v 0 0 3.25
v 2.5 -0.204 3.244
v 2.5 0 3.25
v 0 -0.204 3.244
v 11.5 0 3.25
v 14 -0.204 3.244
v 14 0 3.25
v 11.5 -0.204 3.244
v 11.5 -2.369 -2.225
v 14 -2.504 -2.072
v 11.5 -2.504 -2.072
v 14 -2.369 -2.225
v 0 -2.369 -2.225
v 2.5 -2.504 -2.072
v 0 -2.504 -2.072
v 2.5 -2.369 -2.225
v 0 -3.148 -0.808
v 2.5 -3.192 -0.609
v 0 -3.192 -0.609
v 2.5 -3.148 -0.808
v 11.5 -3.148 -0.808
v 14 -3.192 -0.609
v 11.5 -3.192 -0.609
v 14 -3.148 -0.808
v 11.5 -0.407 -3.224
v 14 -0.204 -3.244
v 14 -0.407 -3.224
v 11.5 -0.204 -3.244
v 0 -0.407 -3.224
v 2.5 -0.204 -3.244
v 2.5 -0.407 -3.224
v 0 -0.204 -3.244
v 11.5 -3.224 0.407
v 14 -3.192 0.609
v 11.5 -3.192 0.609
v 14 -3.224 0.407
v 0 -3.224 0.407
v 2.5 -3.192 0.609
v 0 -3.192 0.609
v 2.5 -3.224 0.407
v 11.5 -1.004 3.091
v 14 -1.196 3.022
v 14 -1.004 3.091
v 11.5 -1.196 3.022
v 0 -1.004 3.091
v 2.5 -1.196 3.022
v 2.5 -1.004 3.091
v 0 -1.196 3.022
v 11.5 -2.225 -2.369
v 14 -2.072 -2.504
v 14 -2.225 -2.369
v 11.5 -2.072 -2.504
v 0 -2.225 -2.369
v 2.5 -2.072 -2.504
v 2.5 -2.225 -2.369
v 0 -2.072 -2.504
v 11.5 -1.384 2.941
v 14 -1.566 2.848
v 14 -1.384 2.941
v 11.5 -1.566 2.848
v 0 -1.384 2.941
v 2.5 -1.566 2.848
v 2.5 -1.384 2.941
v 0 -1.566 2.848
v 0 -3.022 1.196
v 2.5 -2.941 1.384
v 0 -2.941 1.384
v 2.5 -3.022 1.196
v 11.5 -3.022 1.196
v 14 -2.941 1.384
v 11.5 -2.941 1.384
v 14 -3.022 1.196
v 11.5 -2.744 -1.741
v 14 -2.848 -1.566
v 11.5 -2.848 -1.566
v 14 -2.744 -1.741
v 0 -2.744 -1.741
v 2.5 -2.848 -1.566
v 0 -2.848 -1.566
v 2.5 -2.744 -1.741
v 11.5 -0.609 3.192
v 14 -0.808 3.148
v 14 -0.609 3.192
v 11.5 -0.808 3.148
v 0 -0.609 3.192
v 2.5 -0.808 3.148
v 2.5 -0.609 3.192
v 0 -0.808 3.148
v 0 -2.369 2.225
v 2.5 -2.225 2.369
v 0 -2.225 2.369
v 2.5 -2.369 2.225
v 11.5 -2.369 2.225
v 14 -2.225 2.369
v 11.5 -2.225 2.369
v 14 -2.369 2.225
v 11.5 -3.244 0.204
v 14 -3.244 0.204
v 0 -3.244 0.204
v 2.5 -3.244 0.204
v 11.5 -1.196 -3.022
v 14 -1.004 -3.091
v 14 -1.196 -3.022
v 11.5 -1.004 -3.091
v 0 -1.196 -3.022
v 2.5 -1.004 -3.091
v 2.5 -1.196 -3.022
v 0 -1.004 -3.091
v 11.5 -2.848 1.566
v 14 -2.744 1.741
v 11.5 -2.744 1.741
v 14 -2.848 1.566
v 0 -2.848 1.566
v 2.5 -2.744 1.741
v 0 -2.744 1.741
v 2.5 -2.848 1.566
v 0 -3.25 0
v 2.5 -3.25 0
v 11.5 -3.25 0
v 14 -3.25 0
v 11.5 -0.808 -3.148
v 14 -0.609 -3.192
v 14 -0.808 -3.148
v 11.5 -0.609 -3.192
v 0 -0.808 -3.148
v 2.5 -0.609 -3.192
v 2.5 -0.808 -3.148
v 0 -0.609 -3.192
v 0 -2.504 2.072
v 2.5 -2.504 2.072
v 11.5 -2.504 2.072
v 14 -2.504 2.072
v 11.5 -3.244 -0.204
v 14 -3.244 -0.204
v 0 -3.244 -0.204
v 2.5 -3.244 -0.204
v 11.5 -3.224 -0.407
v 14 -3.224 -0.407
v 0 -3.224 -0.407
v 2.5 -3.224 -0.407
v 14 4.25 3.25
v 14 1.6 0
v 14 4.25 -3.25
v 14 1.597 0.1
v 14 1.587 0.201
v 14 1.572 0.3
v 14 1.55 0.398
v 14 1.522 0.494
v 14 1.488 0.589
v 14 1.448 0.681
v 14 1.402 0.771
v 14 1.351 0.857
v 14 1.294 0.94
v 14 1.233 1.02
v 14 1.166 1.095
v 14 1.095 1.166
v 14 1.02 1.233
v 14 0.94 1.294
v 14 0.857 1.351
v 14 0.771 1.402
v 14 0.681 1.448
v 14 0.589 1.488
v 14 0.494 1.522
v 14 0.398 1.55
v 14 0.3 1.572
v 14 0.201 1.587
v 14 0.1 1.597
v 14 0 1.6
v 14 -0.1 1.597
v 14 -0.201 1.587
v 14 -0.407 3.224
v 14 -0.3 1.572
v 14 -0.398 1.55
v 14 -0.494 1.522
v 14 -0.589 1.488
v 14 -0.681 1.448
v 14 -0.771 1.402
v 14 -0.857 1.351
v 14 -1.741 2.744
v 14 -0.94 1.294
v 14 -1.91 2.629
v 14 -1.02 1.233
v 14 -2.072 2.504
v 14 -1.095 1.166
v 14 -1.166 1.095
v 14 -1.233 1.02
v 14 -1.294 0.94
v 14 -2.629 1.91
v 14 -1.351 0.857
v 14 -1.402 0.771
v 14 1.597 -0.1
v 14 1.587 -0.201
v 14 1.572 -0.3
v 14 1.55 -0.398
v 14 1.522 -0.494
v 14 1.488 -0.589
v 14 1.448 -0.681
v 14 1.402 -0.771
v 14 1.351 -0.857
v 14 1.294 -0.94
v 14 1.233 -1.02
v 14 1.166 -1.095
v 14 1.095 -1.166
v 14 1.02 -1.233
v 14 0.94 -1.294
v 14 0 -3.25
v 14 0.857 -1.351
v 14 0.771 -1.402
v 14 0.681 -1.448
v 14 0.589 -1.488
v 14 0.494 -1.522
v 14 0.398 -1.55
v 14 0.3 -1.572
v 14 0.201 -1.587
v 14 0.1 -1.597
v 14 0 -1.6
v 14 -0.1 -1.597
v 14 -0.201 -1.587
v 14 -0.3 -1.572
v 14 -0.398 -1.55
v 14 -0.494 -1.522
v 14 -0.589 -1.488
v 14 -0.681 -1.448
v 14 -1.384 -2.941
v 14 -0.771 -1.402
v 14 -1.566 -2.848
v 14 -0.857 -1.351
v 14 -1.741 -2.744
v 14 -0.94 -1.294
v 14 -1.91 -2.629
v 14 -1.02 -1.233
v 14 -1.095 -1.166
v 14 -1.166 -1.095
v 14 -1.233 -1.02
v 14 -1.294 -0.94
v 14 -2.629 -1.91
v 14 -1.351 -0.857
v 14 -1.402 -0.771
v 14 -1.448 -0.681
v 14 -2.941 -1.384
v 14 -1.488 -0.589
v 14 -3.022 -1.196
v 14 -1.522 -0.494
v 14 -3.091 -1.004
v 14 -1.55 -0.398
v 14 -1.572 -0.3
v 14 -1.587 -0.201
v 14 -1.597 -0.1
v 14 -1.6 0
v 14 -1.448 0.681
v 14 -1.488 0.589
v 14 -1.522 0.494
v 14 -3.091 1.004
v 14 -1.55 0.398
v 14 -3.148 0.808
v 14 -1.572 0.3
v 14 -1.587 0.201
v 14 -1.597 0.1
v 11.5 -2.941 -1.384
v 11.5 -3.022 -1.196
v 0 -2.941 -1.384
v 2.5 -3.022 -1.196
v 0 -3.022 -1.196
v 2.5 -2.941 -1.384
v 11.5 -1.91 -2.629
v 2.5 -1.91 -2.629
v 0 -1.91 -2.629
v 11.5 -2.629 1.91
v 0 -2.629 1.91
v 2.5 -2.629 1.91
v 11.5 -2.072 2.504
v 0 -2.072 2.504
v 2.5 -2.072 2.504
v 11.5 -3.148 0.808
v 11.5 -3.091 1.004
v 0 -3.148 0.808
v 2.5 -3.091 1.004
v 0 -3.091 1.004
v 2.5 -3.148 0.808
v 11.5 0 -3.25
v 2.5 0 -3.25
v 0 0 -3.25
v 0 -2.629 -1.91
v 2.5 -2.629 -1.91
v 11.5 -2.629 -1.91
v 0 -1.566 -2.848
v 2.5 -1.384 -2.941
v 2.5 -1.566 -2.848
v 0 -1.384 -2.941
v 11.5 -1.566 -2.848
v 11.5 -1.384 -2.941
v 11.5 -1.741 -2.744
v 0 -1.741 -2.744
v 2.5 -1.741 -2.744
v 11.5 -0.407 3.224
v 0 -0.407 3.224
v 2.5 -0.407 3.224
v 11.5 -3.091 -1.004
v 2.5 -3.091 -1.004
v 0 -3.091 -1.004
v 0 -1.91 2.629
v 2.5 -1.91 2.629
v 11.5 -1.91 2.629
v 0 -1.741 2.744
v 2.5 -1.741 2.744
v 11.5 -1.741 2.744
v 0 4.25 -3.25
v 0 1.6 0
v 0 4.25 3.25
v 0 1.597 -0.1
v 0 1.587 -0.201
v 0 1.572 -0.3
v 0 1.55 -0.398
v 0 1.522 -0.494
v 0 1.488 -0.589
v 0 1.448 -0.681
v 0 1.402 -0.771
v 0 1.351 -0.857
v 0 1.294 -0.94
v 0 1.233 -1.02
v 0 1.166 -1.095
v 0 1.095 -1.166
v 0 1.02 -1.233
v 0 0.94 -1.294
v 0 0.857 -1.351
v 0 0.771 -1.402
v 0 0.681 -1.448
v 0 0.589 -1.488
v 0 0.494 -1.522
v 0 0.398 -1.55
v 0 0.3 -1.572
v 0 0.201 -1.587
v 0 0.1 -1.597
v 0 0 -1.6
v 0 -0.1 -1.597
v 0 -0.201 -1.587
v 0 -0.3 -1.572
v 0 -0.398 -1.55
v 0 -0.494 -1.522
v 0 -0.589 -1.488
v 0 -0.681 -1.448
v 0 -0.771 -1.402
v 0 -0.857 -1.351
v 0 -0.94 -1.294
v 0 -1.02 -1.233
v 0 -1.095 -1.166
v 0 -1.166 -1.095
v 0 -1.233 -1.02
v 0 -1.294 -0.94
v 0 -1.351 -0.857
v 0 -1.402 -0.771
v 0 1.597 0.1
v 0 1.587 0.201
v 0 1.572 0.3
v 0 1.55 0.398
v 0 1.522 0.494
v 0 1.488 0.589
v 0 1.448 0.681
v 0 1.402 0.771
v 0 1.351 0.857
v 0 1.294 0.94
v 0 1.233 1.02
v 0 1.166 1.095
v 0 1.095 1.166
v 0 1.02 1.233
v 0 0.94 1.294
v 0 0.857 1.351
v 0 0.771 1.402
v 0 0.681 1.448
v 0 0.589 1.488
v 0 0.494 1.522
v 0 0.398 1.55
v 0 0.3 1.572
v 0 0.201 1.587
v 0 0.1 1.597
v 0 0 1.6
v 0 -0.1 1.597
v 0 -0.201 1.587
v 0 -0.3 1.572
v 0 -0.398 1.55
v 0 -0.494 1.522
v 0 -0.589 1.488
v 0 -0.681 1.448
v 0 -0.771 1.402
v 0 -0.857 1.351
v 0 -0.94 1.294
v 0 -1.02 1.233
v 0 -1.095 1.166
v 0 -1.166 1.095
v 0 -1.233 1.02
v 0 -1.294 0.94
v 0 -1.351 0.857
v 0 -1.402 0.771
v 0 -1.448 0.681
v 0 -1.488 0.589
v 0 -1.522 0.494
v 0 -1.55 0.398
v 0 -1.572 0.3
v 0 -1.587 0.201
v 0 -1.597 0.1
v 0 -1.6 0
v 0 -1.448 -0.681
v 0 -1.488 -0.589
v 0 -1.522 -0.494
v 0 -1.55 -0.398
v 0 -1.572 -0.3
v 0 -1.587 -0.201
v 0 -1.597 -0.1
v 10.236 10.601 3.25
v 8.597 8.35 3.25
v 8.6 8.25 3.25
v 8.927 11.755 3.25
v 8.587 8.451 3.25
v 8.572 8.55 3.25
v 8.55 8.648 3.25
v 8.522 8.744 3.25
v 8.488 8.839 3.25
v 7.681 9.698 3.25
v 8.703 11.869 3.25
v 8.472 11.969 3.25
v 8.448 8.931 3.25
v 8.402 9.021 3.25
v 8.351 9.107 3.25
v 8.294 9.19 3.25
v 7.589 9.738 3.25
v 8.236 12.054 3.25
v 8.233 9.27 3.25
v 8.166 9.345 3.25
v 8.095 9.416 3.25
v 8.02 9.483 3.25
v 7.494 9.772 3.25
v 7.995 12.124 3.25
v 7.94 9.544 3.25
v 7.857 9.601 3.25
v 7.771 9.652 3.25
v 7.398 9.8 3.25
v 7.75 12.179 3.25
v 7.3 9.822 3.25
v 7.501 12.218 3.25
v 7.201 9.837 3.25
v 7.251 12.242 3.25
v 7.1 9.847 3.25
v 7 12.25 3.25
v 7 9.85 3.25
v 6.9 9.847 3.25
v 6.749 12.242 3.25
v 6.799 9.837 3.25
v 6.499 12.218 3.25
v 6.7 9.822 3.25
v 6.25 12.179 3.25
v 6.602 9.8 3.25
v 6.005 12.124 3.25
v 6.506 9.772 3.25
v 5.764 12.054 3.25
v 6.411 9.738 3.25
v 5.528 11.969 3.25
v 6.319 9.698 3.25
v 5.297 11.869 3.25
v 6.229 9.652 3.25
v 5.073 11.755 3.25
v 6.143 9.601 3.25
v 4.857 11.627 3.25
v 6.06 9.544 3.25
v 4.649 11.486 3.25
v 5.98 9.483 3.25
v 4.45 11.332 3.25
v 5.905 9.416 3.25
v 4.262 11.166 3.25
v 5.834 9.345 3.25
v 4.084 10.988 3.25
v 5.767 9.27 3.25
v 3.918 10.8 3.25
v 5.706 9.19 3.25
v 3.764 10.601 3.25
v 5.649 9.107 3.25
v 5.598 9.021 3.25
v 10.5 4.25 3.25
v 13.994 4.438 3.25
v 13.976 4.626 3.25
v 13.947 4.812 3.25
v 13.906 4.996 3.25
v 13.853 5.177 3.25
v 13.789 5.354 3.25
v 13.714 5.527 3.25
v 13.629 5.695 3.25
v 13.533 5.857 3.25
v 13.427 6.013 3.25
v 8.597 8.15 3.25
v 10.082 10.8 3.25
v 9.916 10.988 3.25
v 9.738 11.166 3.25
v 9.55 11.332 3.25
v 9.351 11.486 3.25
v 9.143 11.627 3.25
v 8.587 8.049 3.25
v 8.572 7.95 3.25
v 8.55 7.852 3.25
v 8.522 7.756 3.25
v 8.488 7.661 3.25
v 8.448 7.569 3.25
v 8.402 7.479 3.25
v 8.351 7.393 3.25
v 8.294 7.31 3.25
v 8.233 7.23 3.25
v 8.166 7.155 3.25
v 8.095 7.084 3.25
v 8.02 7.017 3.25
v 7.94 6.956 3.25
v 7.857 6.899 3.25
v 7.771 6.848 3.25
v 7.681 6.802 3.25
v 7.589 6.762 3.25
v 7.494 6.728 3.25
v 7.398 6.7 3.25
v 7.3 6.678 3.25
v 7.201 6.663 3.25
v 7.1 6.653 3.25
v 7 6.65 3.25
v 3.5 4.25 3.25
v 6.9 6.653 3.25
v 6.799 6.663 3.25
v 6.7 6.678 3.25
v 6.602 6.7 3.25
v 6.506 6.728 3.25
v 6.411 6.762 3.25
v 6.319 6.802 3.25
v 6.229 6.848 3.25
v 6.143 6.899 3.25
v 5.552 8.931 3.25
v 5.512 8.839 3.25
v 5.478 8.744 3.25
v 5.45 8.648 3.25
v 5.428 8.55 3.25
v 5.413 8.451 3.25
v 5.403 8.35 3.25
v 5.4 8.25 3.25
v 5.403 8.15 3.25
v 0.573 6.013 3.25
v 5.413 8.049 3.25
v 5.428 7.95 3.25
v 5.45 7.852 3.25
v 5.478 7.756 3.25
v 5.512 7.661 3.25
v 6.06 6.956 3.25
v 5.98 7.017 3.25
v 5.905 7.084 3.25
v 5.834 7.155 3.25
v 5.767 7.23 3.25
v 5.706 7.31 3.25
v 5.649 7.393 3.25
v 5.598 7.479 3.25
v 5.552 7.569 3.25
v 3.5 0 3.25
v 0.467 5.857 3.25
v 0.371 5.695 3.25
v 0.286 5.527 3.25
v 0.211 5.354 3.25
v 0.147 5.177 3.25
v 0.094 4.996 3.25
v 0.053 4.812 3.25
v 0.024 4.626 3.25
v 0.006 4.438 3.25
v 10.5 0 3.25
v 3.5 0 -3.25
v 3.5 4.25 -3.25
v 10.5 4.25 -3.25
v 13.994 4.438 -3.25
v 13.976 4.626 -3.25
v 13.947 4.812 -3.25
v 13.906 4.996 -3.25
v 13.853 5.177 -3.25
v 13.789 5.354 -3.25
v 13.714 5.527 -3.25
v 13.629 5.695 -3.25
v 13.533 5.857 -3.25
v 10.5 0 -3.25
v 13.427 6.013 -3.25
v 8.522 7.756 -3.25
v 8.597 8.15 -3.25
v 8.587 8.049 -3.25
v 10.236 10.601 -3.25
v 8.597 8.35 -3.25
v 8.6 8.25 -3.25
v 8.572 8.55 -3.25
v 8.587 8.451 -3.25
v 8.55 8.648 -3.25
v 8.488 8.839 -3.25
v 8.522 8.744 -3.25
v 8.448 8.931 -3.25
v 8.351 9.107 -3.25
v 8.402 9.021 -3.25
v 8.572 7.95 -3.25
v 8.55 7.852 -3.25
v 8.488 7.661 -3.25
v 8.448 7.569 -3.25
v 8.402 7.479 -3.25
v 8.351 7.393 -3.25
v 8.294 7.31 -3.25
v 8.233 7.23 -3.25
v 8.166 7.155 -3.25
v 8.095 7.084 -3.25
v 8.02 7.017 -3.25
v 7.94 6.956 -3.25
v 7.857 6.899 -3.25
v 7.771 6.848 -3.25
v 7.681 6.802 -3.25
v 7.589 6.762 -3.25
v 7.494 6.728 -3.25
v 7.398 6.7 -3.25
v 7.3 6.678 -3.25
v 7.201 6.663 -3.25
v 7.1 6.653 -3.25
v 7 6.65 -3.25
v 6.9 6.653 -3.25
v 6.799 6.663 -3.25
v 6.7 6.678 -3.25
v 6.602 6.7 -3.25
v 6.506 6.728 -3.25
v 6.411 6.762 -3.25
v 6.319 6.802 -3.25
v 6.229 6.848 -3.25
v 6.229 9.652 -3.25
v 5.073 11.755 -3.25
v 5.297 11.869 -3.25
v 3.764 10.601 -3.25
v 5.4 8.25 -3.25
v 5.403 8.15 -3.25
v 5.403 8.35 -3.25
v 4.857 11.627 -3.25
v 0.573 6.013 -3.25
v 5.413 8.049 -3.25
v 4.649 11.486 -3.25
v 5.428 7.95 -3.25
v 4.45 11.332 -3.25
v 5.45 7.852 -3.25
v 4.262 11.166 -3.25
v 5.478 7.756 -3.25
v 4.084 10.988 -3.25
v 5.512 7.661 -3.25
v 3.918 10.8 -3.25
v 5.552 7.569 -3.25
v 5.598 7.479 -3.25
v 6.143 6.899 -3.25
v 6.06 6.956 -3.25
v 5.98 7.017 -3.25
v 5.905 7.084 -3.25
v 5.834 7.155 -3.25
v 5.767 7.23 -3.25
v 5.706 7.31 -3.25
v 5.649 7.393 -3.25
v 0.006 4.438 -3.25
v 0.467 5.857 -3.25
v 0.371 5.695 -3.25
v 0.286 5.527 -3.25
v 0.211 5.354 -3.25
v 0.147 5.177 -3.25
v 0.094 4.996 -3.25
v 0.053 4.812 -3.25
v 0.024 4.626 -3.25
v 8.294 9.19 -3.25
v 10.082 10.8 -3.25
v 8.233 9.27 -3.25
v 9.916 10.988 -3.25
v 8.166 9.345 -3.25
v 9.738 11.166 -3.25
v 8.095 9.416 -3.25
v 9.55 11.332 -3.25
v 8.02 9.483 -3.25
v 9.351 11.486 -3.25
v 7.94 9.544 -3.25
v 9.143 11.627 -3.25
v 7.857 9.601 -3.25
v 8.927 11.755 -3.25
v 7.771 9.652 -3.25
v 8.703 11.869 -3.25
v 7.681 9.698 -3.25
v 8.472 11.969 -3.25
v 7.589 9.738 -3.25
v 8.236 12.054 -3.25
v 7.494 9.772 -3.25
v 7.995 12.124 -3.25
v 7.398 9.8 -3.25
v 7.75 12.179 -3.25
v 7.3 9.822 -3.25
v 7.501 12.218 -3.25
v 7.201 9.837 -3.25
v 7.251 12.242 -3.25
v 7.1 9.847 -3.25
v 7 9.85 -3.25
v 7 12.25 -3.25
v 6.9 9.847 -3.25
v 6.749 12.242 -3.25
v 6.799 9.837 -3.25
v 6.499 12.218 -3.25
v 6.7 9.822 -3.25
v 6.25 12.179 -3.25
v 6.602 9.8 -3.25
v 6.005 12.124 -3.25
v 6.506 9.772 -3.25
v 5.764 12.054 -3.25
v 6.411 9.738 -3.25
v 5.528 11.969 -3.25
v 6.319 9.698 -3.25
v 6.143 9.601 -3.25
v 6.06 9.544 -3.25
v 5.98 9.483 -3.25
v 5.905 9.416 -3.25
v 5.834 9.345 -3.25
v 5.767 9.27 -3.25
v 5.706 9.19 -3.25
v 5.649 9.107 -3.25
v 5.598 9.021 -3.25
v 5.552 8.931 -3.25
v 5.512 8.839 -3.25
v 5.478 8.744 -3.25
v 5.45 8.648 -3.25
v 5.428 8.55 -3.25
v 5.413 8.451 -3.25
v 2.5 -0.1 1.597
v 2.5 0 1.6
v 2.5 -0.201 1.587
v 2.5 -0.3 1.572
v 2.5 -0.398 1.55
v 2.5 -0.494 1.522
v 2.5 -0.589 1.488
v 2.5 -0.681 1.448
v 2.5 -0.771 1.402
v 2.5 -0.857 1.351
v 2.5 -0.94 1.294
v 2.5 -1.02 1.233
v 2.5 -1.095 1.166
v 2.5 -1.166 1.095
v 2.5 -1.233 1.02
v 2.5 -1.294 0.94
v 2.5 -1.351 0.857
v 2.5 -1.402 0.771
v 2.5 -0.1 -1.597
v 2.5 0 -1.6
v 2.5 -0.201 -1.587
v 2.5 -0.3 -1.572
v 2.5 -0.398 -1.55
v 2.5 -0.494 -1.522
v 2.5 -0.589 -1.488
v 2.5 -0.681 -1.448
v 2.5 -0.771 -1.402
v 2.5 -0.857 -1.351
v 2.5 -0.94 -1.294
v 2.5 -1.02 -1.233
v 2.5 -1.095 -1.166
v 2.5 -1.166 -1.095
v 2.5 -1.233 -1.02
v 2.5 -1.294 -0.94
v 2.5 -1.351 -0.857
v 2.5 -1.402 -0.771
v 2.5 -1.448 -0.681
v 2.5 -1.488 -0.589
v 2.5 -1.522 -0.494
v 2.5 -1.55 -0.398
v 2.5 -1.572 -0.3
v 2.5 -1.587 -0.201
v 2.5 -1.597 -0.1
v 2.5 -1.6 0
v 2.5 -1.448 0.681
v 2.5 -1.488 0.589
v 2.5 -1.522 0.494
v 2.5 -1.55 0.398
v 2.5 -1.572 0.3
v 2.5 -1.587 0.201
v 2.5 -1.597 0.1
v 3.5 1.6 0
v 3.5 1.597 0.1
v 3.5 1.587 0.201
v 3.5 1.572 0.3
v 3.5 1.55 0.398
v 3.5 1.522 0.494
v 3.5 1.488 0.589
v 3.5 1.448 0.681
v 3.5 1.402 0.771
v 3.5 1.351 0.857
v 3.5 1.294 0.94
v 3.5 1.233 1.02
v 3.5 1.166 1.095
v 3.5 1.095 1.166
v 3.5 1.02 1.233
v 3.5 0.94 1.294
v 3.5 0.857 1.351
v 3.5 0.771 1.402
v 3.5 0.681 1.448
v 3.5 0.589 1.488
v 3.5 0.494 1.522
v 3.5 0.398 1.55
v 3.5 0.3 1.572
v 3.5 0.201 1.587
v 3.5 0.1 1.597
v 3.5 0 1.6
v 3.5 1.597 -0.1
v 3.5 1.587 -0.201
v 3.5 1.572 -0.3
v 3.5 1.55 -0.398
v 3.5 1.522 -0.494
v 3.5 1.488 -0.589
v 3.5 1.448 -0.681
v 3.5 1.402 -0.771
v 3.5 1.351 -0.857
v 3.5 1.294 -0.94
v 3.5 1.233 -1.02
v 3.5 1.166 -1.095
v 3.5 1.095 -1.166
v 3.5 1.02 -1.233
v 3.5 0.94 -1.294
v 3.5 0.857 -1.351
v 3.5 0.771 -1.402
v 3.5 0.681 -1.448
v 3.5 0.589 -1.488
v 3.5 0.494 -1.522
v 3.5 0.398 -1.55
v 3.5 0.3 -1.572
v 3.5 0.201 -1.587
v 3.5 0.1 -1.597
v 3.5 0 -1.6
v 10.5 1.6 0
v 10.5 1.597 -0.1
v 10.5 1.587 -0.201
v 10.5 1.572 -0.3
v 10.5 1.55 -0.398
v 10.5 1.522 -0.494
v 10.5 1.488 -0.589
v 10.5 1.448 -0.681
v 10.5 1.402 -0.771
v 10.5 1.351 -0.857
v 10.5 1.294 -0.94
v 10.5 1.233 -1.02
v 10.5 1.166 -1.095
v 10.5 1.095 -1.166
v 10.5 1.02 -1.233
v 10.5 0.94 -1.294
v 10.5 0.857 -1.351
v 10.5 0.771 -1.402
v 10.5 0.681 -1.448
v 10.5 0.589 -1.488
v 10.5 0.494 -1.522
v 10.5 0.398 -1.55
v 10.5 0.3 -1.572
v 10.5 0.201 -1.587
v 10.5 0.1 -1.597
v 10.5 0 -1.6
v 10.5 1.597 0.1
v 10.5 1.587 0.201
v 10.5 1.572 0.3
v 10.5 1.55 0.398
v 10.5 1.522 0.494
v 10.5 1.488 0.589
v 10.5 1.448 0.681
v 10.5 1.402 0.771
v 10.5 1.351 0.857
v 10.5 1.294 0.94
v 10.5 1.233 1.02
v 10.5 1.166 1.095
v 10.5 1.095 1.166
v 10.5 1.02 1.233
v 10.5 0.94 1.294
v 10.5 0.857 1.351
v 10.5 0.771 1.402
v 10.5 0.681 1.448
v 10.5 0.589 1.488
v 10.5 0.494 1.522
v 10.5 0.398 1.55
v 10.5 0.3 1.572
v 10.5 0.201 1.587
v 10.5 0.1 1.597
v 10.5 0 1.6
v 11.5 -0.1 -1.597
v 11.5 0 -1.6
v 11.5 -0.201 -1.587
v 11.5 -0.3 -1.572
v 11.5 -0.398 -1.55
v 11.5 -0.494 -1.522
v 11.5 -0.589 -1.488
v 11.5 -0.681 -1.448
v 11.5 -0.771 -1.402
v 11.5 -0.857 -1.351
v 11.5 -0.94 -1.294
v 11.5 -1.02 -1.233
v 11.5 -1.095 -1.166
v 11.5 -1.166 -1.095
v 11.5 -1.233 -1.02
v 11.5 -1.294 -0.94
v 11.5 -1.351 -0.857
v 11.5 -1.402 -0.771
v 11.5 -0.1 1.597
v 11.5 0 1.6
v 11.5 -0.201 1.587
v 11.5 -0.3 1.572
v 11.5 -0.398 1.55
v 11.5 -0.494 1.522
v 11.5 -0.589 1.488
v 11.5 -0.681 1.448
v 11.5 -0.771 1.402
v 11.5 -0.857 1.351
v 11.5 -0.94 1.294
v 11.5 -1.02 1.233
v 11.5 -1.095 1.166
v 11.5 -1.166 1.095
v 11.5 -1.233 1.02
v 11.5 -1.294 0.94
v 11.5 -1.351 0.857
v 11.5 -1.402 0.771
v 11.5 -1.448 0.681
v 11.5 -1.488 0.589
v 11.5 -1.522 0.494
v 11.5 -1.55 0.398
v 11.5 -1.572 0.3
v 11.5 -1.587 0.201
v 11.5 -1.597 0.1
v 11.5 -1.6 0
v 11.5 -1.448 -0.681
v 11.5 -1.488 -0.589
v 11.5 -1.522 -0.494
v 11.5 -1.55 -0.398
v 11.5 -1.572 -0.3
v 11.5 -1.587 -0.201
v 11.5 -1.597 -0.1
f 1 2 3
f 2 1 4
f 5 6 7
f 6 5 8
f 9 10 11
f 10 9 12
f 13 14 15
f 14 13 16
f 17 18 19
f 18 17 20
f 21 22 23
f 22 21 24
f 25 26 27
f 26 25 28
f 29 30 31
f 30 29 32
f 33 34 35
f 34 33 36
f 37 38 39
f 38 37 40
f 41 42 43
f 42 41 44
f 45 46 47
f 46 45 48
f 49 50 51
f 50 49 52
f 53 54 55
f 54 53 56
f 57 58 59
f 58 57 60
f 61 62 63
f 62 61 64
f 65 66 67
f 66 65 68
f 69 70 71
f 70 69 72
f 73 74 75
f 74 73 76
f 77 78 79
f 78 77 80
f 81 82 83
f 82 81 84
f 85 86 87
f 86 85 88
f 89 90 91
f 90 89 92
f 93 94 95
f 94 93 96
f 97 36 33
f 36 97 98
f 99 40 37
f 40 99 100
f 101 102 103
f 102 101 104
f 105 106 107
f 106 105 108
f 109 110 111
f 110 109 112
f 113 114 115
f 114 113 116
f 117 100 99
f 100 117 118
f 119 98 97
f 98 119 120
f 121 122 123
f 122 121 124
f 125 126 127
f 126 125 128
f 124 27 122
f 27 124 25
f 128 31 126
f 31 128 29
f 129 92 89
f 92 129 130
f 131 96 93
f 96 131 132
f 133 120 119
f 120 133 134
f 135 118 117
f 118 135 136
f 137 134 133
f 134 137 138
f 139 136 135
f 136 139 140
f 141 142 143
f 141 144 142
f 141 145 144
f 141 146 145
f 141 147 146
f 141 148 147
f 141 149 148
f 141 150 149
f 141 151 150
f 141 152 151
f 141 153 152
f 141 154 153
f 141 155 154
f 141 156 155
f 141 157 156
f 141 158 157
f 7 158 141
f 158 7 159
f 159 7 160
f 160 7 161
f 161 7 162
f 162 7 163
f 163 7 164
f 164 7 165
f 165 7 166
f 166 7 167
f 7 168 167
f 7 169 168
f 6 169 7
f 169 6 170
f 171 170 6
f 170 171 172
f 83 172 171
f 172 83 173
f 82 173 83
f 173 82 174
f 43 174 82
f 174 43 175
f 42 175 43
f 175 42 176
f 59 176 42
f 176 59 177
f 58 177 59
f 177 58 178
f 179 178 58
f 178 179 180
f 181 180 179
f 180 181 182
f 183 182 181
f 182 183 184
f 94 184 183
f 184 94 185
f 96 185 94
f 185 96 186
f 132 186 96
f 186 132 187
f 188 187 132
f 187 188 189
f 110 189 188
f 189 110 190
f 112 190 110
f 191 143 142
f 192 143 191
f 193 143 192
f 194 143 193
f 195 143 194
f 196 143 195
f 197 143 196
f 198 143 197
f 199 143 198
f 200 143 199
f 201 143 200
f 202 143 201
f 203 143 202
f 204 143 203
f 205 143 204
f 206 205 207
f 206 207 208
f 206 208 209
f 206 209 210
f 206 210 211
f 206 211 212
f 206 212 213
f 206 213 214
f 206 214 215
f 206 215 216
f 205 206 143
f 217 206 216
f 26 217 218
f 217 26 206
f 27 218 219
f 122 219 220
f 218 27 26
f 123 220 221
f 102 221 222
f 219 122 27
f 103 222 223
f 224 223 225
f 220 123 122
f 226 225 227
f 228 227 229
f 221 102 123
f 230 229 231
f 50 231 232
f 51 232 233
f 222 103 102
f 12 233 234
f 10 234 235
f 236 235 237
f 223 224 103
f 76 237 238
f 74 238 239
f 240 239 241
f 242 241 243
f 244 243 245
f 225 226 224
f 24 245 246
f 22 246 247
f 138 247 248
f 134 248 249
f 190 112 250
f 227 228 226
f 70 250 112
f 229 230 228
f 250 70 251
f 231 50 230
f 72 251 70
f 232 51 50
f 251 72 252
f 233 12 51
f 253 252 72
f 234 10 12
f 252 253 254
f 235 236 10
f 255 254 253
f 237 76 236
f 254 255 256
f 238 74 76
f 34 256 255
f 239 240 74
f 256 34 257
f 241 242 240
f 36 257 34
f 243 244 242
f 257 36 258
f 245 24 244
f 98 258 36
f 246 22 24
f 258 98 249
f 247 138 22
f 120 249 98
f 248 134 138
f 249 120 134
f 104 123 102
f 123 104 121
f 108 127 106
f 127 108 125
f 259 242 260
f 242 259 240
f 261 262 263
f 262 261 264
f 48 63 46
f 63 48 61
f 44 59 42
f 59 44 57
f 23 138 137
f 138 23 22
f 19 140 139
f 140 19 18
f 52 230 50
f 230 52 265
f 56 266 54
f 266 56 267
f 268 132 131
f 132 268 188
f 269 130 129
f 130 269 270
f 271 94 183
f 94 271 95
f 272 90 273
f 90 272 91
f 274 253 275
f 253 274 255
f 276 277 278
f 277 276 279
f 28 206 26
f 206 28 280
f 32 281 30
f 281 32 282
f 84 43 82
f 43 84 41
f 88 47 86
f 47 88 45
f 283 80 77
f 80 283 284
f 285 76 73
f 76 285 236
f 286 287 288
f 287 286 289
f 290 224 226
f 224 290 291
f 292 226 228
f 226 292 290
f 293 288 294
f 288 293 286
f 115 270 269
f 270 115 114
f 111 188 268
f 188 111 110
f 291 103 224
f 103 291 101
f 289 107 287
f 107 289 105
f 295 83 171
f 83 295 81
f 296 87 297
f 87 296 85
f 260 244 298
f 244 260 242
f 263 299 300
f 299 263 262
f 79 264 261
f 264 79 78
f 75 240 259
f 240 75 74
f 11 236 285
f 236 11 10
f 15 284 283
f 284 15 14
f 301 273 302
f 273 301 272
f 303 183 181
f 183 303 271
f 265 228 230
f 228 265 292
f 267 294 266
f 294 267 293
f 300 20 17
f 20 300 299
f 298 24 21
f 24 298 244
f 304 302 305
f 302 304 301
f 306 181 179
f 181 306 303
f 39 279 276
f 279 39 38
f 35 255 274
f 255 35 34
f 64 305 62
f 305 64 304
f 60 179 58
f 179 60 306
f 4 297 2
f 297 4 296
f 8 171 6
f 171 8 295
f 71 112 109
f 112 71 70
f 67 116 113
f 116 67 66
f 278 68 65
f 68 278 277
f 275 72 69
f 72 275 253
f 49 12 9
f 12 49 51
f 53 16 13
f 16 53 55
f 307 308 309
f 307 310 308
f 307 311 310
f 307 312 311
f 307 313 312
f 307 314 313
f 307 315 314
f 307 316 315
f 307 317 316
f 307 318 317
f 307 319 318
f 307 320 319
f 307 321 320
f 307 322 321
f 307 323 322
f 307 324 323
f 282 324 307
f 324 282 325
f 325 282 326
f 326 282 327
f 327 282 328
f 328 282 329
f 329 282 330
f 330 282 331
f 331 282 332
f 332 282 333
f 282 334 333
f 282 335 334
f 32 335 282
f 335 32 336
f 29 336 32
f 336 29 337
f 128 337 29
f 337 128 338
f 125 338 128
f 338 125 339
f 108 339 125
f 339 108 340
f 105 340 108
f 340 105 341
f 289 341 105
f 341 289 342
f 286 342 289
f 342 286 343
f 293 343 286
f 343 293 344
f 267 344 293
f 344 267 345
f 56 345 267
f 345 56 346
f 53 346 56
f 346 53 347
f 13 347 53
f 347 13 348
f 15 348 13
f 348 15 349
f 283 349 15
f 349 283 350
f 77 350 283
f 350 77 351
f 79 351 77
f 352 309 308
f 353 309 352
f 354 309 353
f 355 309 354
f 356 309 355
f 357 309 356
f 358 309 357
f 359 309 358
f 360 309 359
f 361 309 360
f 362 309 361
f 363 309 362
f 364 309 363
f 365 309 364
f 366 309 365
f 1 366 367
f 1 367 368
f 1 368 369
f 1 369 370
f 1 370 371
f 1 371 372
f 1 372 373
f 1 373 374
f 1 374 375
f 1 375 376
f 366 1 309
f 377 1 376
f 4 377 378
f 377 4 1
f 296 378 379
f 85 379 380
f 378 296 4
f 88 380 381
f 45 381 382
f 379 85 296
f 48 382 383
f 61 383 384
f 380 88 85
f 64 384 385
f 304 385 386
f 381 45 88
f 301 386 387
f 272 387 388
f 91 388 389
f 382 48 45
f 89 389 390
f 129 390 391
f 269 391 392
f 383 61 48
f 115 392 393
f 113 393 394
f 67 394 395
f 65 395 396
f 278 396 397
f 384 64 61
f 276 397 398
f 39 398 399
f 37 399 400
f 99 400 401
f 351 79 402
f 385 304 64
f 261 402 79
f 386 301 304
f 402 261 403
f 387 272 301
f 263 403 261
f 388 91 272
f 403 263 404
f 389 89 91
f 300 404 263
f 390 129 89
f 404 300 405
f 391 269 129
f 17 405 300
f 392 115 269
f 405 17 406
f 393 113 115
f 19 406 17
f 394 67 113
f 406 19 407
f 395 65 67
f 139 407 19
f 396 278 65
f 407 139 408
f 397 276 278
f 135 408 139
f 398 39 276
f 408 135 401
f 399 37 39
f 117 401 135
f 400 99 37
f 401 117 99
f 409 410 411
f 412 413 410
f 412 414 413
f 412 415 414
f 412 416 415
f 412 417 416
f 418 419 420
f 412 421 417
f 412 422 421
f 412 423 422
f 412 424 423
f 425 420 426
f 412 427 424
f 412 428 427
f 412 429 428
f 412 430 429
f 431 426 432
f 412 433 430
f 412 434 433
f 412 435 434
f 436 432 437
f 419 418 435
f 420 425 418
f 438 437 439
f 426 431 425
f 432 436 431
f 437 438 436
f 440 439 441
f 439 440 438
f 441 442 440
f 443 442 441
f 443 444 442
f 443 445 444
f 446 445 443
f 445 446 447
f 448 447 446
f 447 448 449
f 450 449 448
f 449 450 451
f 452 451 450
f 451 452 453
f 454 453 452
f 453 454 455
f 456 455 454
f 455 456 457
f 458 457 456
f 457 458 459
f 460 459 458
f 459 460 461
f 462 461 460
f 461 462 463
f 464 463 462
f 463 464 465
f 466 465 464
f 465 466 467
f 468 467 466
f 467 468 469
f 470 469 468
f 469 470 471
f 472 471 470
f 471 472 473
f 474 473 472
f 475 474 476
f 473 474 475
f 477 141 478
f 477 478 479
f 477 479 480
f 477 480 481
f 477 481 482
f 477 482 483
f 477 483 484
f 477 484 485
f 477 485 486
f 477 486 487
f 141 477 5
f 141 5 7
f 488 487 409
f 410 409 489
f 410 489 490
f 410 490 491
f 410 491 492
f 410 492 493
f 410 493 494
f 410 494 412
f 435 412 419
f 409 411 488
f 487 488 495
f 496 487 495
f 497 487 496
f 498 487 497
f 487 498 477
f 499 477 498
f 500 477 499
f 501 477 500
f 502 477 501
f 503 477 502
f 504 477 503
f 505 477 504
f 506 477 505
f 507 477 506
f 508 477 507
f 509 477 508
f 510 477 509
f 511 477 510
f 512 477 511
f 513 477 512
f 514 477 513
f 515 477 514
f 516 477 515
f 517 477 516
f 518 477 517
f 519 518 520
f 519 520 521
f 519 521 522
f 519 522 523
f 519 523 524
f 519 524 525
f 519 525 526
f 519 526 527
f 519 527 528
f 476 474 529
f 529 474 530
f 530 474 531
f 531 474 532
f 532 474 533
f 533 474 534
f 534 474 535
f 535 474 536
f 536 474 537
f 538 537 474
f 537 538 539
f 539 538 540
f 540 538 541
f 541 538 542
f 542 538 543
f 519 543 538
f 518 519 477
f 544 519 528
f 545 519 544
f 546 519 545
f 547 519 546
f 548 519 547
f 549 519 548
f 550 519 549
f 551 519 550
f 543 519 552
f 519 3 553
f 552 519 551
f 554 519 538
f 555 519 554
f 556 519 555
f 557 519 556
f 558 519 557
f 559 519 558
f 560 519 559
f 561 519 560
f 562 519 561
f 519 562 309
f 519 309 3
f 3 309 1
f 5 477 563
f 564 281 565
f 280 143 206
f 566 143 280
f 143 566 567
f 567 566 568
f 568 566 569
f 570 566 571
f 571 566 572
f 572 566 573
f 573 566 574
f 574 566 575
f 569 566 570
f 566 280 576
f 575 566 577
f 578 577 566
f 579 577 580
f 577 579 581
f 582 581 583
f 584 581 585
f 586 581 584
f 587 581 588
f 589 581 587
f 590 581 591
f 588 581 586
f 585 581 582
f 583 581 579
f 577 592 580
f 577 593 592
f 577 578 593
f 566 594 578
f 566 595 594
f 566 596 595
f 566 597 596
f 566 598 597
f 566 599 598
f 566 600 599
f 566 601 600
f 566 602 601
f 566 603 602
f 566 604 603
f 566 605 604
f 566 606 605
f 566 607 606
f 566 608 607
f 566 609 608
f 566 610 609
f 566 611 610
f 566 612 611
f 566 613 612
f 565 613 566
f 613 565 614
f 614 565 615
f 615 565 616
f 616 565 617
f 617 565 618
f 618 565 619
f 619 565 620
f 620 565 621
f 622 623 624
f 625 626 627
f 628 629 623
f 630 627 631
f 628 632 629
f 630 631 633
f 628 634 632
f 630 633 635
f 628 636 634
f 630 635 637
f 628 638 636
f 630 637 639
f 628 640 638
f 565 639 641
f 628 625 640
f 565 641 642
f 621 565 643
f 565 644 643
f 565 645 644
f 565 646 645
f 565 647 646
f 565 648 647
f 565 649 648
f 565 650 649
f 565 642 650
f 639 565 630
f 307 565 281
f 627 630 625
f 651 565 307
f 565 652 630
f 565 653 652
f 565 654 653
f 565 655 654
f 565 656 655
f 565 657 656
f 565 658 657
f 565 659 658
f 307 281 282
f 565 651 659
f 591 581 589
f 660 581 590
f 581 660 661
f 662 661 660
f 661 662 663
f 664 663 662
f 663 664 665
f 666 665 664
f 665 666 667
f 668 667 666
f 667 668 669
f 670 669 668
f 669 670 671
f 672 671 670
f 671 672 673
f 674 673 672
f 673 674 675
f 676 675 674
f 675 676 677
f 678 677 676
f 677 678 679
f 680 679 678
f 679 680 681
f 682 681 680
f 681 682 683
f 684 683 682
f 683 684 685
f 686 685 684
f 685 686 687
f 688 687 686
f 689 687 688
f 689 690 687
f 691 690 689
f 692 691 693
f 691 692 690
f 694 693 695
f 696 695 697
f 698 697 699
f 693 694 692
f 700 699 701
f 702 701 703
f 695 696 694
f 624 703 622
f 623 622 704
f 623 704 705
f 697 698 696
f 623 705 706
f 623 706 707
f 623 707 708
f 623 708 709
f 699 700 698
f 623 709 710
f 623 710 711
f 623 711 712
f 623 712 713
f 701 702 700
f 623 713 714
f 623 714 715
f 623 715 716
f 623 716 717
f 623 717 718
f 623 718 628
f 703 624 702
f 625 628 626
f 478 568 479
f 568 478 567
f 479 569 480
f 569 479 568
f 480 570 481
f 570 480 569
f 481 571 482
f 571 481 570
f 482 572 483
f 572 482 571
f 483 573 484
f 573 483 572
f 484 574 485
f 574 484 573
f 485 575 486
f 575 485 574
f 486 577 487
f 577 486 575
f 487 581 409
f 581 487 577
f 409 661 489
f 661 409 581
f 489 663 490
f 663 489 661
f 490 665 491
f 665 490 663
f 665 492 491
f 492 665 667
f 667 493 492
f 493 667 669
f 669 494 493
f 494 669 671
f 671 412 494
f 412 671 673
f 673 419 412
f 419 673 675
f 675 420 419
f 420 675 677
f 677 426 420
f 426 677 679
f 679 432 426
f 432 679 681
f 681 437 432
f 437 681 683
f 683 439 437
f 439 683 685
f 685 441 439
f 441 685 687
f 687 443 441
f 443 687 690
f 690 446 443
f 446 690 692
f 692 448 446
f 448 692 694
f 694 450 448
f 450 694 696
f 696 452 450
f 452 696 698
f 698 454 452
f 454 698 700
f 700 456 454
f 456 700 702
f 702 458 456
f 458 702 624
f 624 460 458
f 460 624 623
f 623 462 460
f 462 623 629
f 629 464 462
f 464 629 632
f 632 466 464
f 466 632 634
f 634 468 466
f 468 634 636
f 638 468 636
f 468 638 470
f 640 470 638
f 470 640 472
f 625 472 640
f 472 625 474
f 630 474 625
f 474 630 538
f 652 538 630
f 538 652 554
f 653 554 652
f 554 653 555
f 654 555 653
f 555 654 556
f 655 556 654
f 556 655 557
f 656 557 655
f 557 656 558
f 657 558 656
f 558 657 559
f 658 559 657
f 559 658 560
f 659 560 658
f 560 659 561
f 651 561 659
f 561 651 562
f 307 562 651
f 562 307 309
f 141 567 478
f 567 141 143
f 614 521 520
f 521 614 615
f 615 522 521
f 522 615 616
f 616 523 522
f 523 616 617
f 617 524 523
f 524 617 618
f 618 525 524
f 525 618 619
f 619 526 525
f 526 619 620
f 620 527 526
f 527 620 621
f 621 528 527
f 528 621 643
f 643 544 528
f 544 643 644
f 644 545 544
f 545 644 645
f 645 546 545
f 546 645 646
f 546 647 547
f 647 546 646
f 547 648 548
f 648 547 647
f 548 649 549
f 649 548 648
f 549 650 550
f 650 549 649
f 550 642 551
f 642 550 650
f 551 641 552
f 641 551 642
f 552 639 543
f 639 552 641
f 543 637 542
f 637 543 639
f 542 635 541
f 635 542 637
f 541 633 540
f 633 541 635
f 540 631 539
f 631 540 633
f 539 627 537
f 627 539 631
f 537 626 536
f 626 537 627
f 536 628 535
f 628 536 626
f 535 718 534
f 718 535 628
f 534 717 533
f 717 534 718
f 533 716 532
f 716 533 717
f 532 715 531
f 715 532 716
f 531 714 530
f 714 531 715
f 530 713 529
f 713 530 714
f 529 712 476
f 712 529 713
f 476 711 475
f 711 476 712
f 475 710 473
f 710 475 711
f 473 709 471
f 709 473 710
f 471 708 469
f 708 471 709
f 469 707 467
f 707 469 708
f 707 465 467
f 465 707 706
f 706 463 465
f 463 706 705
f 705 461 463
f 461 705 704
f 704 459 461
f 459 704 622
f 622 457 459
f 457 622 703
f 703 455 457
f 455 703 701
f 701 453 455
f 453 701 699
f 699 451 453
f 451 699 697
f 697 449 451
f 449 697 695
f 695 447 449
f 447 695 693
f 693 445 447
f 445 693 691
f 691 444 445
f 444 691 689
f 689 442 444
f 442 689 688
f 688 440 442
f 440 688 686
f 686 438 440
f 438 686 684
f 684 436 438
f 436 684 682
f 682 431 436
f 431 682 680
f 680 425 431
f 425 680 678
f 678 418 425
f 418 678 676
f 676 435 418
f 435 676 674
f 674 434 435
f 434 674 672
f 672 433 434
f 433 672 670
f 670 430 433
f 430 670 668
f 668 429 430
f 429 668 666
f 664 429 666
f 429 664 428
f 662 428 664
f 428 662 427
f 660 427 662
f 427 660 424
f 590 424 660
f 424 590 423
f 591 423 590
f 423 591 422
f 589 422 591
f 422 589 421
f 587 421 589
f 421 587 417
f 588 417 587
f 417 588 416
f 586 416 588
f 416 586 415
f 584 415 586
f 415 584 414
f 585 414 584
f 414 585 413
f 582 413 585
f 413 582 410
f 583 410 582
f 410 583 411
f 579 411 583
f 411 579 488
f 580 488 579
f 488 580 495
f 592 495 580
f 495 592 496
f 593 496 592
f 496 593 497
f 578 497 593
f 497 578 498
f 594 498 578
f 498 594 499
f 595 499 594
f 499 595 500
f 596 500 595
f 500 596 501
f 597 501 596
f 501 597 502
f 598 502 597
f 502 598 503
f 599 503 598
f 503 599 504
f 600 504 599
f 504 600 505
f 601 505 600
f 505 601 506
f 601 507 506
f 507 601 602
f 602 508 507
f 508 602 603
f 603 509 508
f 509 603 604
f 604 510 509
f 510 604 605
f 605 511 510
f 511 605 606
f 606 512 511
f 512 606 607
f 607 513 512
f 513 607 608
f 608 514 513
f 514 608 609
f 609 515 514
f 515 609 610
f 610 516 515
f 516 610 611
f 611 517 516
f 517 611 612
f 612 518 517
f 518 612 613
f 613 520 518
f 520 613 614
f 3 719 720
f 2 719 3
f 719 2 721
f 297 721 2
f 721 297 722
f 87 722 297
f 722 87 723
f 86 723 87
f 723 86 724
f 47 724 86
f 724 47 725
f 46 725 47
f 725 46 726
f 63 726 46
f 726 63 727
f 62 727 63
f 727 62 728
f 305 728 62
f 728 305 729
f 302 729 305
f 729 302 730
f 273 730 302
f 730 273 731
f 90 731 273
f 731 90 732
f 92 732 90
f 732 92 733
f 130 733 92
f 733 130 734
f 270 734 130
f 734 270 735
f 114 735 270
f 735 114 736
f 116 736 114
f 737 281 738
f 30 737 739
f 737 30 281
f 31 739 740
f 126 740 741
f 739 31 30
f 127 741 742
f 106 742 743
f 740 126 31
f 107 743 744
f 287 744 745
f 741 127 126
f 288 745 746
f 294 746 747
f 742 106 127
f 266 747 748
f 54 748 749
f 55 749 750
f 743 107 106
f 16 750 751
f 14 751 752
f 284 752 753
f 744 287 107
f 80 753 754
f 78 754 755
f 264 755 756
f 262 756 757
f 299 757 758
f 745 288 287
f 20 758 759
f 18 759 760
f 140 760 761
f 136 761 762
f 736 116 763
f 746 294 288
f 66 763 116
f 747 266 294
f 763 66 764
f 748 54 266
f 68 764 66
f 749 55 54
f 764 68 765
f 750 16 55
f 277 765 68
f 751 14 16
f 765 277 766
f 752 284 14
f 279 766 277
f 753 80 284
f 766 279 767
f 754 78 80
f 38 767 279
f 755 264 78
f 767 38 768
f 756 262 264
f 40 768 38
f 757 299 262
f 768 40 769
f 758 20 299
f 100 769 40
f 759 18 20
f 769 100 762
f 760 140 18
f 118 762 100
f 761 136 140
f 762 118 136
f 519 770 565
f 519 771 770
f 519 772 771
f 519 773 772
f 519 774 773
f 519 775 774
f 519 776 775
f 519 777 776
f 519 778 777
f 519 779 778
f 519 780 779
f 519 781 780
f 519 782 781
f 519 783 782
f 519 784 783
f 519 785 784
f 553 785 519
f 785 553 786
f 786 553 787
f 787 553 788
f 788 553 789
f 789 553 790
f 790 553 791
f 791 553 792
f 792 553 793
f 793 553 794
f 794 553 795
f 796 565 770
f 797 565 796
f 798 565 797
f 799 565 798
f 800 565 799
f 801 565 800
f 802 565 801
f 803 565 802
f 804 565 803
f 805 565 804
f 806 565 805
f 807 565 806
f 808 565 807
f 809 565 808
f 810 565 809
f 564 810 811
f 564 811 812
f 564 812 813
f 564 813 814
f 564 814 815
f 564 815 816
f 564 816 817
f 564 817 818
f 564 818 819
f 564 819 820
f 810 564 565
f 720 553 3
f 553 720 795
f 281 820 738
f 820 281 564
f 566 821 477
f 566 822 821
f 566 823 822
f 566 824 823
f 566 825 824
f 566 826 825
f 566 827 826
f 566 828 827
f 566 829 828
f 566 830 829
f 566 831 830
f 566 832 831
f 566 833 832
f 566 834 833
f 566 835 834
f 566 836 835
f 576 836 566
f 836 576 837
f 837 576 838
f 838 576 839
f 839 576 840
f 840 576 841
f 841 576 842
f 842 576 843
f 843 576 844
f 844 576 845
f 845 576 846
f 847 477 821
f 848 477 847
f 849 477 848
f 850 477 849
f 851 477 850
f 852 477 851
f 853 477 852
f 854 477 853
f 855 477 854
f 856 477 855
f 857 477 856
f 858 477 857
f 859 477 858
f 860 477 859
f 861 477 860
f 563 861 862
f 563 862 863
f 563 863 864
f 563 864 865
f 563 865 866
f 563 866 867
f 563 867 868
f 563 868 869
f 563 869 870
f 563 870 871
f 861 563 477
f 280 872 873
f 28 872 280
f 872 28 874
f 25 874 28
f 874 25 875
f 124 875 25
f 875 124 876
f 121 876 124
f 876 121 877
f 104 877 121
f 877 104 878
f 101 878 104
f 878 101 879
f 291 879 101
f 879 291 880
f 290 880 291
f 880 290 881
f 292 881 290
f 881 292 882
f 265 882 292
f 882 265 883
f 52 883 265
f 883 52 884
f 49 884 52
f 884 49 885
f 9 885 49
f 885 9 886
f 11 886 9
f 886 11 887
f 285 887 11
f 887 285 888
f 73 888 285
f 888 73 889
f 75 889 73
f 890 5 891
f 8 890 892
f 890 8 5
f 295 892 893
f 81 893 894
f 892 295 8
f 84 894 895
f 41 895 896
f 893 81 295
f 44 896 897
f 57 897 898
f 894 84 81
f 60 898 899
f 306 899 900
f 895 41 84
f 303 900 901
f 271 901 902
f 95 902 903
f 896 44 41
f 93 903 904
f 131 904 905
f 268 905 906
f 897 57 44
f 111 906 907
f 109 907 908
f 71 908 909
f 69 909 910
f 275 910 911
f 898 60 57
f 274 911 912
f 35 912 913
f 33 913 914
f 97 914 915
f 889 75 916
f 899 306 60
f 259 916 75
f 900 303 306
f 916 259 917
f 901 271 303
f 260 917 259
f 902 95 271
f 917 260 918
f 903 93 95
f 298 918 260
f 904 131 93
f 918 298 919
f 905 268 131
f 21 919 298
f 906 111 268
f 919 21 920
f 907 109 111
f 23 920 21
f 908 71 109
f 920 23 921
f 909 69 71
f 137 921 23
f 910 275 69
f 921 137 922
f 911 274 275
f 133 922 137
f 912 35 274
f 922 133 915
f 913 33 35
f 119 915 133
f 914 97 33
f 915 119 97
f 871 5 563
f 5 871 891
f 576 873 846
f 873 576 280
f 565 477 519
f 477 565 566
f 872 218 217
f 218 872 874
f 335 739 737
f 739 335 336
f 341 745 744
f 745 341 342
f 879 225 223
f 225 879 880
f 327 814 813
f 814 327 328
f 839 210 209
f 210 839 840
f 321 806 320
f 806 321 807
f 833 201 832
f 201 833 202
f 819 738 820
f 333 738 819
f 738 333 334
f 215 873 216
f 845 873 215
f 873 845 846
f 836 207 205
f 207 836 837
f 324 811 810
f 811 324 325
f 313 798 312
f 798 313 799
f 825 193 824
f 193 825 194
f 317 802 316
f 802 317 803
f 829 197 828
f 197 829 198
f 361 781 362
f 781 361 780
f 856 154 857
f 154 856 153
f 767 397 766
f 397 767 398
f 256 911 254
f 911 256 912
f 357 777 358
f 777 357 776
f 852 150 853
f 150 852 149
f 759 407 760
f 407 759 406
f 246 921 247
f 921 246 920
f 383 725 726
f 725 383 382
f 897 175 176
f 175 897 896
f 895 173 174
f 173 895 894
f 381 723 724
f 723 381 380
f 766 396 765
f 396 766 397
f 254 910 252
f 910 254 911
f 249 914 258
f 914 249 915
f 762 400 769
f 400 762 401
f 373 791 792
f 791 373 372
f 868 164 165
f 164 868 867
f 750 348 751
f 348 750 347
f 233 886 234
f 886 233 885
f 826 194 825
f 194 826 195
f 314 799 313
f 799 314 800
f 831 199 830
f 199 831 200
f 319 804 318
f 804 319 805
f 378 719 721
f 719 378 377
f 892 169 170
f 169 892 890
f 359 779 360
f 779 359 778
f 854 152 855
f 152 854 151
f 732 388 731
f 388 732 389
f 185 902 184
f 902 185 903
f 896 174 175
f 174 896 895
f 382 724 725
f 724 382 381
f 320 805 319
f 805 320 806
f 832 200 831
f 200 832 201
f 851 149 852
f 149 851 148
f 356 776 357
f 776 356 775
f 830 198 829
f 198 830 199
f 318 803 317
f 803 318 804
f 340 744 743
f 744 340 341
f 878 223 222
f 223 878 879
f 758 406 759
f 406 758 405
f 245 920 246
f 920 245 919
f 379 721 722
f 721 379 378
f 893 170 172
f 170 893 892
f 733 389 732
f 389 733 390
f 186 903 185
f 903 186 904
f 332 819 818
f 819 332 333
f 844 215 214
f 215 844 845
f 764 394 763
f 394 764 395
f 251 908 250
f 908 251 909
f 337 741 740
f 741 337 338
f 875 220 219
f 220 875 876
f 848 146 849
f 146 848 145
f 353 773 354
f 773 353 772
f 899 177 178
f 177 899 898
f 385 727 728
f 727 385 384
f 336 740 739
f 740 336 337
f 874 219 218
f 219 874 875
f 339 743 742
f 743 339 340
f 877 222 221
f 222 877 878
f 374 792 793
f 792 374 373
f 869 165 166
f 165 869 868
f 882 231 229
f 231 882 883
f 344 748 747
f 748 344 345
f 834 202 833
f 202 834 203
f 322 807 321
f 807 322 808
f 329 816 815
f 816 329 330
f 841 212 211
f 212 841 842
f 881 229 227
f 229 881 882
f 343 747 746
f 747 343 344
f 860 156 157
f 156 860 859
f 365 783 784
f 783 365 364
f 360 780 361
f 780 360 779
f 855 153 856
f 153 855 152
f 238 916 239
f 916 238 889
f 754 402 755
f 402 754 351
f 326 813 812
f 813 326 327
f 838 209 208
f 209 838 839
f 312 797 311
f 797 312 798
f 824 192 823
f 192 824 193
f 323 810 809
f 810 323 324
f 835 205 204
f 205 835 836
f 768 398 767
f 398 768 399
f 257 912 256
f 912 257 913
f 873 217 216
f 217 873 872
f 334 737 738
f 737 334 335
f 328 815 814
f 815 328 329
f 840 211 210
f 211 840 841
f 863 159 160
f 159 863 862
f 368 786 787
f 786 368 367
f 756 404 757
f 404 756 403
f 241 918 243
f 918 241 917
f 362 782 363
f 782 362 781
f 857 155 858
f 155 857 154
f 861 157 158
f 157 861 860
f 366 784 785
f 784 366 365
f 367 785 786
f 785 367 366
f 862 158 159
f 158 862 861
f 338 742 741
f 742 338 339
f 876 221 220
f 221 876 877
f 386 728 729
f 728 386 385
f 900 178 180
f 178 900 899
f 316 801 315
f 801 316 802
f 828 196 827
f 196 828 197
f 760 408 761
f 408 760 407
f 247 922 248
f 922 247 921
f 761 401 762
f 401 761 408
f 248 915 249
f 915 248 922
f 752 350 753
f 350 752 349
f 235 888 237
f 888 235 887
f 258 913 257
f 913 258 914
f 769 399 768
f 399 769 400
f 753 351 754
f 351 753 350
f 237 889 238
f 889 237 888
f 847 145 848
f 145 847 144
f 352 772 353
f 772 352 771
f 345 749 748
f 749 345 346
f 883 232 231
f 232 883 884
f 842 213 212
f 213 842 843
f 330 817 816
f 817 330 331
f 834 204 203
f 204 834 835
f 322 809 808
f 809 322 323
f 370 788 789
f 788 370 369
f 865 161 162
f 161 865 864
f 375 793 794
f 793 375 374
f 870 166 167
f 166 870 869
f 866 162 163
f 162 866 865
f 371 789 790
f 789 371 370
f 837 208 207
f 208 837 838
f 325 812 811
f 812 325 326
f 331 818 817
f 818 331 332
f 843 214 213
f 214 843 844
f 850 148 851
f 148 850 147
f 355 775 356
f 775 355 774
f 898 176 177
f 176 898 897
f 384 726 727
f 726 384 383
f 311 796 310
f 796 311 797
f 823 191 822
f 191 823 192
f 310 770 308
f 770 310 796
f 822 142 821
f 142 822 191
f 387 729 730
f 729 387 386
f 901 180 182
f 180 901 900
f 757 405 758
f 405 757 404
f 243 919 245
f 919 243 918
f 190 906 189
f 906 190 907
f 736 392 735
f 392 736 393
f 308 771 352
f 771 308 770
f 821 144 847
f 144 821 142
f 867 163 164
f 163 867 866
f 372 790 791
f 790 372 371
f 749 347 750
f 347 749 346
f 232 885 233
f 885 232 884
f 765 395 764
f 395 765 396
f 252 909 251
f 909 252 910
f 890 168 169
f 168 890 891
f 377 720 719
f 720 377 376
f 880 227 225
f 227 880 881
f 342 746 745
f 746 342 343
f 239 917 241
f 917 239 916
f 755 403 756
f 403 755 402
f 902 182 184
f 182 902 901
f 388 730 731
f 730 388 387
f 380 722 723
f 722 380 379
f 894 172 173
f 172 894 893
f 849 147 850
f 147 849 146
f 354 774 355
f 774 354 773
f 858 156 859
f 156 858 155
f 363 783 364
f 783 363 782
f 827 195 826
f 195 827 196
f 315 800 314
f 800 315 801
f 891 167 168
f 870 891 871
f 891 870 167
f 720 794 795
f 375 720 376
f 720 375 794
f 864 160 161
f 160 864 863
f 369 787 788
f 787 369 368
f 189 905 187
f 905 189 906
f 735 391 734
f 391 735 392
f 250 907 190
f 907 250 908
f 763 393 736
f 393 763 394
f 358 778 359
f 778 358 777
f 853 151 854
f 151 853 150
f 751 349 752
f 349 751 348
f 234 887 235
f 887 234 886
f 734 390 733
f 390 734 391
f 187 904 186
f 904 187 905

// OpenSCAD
$fn = 100;

hole_tol = 0.2; // mm, widen holes a bit to make clearance easier

module clevis() {
    difference() {
        width = 4;
        height = 4;
        hull() {
            translate([width,0]) circle(d=6);
            translate([-width,0]) circle(d=6);
            translate([0, height]) circle(d=8);
        }
        translate([0, height]) circle(d=3+hole_tol);
        translate([0,-50]) square(100, center=true);
    }
}

module original_and_mirror() {
    union() {
        children();
        mirror([0,1,0]) children();
    }
}

*union() {
    base_height=2;
    cylinder(base_height, d=25);
    original_and_mirror() translate([0,-6.5/2,base_height]) rotate([90,0,0]) linear_extrude(3) clevis();
}

t = $preview ? [-14/2,0,14.25] : [25/2+5,0,6.5/2];
r = $preview ? [-90,0,0] : [0,0,0];
translate(t) rotate(r)
!difference() {
    connector_width = 7; // mm
    connector_dia = 6.5; // mm
    connector_hole_dia = 3; // mm
    total_width = connector_width + 7;
    fillet_dia = 6; // mm
    union() {
        rotate([0,90,0]) cylinder(total_width, d=connector_dia);
        translate([0,0,-connector_dia/2]) cube([total_width,(connector_dia/2)+1,connector_dia]);
        translate([total_width/2,(connector_dia/2)+1,-connector_dia/2]) linear_extrude(connector_dia) clevis();
    }
    translate([(total_width-connector_width)/2,-connector_dia/2,-connector_dia/2]) cube([connector_width, connector_dia+1, connector_dia]);
    rotate([0,90,0]) cylinder(total_width, d=connector_hole_dia+hole_tol);
    translate([3.5-1,0,0]) rotate([0,90,0]) intersection() {
        cylinder(1, d=connector_dia);
        translate([-5,-10]) cube([10,10,1]);
    }
    translate([3.5+connector_width,0,0]) rotate([0,90,0]) intersection() {
        cylinder(1, d=connector_dia);
        translate([-5,-10]) cube([10,10,1]);
    }
}
